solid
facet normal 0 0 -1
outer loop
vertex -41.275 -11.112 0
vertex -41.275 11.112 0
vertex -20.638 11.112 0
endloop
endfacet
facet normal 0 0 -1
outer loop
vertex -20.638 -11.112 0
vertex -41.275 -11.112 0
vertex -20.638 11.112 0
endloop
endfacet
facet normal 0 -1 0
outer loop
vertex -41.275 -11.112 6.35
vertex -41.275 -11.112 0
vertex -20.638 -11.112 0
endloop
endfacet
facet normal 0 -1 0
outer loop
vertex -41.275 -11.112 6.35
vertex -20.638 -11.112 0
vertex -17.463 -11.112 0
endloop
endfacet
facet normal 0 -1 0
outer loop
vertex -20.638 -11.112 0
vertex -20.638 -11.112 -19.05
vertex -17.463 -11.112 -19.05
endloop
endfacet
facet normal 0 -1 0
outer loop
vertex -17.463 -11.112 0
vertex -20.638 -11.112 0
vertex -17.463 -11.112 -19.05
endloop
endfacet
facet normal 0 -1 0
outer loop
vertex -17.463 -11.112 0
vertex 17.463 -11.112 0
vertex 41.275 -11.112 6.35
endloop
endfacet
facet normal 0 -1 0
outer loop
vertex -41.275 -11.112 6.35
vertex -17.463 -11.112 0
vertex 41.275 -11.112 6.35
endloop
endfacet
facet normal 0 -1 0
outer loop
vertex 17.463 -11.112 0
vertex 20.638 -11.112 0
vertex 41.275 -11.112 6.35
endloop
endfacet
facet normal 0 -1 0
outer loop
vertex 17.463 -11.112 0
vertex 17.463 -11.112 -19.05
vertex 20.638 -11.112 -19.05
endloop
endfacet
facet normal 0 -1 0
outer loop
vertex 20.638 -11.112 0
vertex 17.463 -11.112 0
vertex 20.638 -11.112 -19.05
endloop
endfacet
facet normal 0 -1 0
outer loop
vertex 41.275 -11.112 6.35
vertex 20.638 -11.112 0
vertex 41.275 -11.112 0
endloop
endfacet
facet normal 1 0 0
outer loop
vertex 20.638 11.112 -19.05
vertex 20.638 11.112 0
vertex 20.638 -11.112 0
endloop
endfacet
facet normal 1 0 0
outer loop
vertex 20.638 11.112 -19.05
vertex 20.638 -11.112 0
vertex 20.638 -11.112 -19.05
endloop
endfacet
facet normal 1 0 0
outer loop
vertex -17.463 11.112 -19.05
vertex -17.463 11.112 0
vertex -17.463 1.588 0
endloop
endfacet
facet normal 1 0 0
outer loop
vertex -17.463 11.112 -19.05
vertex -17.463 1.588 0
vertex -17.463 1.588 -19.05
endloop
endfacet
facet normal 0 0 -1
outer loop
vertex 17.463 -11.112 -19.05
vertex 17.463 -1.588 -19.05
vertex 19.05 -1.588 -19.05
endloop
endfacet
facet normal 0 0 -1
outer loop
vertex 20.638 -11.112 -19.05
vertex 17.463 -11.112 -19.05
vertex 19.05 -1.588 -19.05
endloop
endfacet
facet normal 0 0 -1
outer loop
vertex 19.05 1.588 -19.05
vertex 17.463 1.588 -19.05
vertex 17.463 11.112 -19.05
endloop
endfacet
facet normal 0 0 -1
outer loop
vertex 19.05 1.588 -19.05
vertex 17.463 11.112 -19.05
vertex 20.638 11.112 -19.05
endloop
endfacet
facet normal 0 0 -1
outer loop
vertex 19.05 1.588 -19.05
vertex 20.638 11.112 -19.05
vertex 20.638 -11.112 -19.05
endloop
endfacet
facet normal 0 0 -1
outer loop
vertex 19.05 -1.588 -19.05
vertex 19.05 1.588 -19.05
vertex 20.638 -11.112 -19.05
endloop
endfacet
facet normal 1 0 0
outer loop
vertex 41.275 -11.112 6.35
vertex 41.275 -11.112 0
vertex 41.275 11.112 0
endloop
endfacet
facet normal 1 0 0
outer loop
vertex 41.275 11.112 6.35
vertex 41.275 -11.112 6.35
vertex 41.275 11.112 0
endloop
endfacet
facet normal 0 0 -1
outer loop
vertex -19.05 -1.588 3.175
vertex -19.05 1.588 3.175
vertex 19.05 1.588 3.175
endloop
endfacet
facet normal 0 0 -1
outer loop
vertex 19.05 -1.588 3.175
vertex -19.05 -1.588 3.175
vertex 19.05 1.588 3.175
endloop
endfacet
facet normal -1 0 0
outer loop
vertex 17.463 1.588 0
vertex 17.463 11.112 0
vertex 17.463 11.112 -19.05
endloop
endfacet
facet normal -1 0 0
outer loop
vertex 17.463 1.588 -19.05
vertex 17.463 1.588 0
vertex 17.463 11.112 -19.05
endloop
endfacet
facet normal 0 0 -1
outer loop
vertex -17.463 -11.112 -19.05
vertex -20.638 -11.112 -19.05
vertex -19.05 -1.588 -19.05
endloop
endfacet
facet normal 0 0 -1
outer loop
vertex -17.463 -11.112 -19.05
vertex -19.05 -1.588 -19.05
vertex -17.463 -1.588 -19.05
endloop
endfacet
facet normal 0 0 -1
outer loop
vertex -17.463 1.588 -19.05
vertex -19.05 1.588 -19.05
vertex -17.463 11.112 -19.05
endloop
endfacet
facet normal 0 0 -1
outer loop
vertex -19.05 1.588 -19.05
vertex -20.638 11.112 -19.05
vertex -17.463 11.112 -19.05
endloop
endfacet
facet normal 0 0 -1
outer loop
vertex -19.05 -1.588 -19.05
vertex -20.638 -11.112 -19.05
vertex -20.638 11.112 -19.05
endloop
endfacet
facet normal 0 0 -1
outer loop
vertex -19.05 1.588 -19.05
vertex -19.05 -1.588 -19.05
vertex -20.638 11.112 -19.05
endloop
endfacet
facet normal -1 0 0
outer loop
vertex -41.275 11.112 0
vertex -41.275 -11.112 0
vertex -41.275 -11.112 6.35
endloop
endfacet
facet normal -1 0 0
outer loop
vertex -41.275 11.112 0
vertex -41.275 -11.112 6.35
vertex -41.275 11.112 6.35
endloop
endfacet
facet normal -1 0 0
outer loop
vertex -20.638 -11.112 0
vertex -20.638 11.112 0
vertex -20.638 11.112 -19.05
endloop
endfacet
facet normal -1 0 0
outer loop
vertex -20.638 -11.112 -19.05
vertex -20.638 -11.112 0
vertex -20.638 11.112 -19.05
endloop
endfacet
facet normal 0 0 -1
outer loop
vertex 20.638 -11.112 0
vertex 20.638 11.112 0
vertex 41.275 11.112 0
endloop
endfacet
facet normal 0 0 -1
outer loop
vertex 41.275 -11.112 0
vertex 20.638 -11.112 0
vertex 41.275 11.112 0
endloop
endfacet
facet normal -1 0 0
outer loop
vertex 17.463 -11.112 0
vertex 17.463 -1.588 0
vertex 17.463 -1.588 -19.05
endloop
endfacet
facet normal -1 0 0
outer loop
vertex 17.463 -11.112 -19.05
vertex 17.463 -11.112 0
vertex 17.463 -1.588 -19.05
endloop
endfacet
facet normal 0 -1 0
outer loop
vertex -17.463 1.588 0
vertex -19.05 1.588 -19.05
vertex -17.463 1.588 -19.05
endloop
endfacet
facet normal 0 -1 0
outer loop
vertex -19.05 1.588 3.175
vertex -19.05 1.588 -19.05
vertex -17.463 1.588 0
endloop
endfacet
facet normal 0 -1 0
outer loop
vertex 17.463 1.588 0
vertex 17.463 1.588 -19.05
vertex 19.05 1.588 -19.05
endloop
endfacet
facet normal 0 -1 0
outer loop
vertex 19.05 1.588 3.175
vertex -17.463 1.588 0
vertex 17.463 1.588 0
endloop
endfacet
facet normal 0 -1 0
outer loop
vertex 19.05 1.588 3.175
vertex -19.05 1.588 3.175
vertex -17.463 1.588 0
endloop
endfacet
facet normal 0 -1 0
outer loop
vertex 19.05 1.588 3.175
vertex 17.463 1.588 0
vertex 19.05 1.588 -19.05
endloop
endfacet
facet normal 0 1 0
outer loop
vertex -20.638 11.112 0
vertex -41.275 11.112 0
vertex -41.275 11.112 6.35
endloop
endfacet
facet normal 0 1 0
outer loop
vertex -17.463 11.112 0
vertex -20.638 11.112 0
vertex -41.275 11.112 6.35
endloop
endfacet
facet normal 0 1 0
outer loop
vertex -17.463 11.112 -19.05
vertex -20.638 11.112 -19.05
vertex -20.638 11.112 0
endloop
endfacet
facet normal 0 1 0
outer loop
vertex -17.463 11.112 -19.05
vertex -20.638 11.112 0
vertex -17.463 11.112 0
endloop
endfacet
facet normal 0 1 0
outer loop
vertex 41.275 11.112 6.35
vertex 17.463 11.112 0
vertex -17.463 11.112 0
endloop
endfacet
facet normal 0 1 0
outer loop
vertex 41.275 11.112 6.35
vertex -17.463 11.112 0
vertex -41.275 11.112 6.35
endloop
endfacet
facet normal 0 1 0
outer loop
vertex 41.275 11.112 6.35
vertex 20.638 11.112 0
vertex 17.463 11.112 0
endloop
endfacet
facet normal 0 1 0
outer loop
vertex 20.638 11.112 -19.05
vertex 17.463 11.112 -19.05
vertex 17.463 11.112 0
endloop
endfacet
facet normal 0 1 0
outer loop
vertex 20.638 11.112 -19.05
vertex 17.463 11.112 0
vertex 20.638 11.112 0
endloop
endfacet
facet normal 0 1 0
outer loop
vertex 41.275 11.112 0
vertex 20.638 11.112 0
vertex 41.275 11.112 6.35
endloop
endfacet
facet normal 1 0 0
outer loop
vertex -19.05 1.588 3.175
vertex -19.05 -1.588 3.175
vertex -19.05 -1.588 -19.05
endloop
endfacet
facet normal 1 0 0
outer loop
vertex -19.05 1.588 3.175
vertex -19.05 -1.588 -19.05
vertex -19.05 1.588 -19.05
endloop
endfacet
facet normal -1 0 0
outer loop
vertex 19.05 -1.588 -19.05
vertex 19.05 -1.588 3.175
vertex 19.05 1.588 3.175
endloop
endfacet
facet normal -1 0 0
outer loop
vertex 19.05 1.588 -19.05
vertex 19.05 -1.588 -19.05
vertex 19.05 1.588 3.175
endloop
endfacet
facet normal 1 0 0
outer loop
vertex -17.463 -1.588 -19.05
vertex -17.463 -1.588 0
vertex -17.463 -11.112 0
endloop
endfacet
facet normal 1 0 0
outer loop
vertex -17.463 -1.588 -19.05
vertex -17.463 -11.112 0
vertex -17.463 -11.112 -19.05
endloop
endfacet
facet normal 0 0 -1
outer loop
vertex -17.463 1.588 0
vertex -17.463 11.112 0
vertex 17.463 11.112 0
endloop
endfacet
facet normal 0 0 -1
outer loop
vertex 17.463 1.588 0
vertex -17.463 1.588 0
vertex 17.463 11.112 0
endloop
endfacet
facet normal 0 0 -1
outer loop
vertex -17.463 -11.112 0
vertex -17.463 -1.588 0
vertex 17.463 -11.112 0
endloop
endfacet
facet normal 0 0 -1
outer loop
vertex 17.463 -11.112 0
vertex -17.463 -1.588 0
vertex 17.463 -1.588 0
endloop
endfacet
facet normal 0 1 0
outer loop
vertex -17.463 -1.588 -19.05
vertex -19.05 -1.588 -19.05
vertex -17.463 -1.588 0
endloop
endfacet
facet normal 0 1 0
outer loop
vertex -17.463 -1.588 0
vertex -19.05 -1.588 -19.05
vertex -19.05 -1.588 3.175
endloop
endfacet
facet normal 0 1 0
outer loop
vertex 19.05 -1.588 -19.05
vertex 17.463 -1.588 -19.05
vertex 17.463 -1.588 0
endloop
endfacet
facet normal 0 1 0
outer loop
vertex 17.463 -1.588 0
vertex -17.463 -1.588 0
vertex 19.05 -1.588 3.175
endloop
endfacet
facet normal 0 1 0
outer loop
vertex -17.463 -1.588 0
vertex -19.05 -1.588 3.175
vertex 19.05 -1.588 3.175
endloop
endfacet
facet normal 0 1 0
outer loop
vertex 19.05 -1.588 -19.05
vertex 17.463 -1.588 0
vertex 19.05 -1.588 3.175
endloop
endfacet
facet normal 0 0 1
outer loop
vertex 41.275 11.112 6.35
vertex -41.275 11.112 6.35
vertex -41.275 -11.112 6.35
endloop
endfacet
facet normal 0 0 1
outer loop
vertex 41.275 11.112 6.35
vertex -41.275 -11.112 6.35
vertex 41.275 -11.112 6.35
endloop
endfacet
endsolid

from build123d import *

# Parameters (mm, degrees)
SKETCH1_W           = 82.55
SKETCH1_H           = 22.225
BOSS_EXTRUDE1_DEPTH = 6.35
SKETCH3_W           = 3.175
SKETCH3_H           = 25.4
BOSS_EXTRUDE2_DEPTH = 22.225
CUT_EXTRUDE3_START  = 3.175
SKETCH2_W           = 38.1
SKETCH2_H           = 3.175
CUT_EXTRUDE3_DEPTH  = 50.972604439


with BuildPart() as part:
    # Sketch1 → Boss-Extrude1 (new body)
    with BuildSketch(Plane.XY):
        Rectangle(SKETCH1_W, SKETCH1_H)
    extrude(amount=BOSS_EXTRUDE1_DEPTH)

    # Sketch3 → Boss-Extrude2 (add)
    with BuildSketch(Plane(origin=(0, 11.1125, 0), x_dir=(1, 0, 0), z_dir=(0, 1, 0))):
        with Locations((-19.05, 6.35)):
            Rectangle(SKETCH3_W, SKETCH3_H)
        with Locations((19.05, 6.35)):
            Rectangle(SKETCH3_W, SKETCH3_H)
    extrude(amount=-BOSS_EXTRUDE2_DEPTH)

    # Sketch2 → Cut-Extrude3 (cut, through all)
    with BuildSketch(Plane.XY.offset(CUT_EXTRUDE3_START)):
        Rectangle(SKETCH2_W, SKETCH2_H)
    extrude(amount=-CUT_EXTRUDE3_DEPTH, mode=Mode.SUBTRACT)


solid = part.part
